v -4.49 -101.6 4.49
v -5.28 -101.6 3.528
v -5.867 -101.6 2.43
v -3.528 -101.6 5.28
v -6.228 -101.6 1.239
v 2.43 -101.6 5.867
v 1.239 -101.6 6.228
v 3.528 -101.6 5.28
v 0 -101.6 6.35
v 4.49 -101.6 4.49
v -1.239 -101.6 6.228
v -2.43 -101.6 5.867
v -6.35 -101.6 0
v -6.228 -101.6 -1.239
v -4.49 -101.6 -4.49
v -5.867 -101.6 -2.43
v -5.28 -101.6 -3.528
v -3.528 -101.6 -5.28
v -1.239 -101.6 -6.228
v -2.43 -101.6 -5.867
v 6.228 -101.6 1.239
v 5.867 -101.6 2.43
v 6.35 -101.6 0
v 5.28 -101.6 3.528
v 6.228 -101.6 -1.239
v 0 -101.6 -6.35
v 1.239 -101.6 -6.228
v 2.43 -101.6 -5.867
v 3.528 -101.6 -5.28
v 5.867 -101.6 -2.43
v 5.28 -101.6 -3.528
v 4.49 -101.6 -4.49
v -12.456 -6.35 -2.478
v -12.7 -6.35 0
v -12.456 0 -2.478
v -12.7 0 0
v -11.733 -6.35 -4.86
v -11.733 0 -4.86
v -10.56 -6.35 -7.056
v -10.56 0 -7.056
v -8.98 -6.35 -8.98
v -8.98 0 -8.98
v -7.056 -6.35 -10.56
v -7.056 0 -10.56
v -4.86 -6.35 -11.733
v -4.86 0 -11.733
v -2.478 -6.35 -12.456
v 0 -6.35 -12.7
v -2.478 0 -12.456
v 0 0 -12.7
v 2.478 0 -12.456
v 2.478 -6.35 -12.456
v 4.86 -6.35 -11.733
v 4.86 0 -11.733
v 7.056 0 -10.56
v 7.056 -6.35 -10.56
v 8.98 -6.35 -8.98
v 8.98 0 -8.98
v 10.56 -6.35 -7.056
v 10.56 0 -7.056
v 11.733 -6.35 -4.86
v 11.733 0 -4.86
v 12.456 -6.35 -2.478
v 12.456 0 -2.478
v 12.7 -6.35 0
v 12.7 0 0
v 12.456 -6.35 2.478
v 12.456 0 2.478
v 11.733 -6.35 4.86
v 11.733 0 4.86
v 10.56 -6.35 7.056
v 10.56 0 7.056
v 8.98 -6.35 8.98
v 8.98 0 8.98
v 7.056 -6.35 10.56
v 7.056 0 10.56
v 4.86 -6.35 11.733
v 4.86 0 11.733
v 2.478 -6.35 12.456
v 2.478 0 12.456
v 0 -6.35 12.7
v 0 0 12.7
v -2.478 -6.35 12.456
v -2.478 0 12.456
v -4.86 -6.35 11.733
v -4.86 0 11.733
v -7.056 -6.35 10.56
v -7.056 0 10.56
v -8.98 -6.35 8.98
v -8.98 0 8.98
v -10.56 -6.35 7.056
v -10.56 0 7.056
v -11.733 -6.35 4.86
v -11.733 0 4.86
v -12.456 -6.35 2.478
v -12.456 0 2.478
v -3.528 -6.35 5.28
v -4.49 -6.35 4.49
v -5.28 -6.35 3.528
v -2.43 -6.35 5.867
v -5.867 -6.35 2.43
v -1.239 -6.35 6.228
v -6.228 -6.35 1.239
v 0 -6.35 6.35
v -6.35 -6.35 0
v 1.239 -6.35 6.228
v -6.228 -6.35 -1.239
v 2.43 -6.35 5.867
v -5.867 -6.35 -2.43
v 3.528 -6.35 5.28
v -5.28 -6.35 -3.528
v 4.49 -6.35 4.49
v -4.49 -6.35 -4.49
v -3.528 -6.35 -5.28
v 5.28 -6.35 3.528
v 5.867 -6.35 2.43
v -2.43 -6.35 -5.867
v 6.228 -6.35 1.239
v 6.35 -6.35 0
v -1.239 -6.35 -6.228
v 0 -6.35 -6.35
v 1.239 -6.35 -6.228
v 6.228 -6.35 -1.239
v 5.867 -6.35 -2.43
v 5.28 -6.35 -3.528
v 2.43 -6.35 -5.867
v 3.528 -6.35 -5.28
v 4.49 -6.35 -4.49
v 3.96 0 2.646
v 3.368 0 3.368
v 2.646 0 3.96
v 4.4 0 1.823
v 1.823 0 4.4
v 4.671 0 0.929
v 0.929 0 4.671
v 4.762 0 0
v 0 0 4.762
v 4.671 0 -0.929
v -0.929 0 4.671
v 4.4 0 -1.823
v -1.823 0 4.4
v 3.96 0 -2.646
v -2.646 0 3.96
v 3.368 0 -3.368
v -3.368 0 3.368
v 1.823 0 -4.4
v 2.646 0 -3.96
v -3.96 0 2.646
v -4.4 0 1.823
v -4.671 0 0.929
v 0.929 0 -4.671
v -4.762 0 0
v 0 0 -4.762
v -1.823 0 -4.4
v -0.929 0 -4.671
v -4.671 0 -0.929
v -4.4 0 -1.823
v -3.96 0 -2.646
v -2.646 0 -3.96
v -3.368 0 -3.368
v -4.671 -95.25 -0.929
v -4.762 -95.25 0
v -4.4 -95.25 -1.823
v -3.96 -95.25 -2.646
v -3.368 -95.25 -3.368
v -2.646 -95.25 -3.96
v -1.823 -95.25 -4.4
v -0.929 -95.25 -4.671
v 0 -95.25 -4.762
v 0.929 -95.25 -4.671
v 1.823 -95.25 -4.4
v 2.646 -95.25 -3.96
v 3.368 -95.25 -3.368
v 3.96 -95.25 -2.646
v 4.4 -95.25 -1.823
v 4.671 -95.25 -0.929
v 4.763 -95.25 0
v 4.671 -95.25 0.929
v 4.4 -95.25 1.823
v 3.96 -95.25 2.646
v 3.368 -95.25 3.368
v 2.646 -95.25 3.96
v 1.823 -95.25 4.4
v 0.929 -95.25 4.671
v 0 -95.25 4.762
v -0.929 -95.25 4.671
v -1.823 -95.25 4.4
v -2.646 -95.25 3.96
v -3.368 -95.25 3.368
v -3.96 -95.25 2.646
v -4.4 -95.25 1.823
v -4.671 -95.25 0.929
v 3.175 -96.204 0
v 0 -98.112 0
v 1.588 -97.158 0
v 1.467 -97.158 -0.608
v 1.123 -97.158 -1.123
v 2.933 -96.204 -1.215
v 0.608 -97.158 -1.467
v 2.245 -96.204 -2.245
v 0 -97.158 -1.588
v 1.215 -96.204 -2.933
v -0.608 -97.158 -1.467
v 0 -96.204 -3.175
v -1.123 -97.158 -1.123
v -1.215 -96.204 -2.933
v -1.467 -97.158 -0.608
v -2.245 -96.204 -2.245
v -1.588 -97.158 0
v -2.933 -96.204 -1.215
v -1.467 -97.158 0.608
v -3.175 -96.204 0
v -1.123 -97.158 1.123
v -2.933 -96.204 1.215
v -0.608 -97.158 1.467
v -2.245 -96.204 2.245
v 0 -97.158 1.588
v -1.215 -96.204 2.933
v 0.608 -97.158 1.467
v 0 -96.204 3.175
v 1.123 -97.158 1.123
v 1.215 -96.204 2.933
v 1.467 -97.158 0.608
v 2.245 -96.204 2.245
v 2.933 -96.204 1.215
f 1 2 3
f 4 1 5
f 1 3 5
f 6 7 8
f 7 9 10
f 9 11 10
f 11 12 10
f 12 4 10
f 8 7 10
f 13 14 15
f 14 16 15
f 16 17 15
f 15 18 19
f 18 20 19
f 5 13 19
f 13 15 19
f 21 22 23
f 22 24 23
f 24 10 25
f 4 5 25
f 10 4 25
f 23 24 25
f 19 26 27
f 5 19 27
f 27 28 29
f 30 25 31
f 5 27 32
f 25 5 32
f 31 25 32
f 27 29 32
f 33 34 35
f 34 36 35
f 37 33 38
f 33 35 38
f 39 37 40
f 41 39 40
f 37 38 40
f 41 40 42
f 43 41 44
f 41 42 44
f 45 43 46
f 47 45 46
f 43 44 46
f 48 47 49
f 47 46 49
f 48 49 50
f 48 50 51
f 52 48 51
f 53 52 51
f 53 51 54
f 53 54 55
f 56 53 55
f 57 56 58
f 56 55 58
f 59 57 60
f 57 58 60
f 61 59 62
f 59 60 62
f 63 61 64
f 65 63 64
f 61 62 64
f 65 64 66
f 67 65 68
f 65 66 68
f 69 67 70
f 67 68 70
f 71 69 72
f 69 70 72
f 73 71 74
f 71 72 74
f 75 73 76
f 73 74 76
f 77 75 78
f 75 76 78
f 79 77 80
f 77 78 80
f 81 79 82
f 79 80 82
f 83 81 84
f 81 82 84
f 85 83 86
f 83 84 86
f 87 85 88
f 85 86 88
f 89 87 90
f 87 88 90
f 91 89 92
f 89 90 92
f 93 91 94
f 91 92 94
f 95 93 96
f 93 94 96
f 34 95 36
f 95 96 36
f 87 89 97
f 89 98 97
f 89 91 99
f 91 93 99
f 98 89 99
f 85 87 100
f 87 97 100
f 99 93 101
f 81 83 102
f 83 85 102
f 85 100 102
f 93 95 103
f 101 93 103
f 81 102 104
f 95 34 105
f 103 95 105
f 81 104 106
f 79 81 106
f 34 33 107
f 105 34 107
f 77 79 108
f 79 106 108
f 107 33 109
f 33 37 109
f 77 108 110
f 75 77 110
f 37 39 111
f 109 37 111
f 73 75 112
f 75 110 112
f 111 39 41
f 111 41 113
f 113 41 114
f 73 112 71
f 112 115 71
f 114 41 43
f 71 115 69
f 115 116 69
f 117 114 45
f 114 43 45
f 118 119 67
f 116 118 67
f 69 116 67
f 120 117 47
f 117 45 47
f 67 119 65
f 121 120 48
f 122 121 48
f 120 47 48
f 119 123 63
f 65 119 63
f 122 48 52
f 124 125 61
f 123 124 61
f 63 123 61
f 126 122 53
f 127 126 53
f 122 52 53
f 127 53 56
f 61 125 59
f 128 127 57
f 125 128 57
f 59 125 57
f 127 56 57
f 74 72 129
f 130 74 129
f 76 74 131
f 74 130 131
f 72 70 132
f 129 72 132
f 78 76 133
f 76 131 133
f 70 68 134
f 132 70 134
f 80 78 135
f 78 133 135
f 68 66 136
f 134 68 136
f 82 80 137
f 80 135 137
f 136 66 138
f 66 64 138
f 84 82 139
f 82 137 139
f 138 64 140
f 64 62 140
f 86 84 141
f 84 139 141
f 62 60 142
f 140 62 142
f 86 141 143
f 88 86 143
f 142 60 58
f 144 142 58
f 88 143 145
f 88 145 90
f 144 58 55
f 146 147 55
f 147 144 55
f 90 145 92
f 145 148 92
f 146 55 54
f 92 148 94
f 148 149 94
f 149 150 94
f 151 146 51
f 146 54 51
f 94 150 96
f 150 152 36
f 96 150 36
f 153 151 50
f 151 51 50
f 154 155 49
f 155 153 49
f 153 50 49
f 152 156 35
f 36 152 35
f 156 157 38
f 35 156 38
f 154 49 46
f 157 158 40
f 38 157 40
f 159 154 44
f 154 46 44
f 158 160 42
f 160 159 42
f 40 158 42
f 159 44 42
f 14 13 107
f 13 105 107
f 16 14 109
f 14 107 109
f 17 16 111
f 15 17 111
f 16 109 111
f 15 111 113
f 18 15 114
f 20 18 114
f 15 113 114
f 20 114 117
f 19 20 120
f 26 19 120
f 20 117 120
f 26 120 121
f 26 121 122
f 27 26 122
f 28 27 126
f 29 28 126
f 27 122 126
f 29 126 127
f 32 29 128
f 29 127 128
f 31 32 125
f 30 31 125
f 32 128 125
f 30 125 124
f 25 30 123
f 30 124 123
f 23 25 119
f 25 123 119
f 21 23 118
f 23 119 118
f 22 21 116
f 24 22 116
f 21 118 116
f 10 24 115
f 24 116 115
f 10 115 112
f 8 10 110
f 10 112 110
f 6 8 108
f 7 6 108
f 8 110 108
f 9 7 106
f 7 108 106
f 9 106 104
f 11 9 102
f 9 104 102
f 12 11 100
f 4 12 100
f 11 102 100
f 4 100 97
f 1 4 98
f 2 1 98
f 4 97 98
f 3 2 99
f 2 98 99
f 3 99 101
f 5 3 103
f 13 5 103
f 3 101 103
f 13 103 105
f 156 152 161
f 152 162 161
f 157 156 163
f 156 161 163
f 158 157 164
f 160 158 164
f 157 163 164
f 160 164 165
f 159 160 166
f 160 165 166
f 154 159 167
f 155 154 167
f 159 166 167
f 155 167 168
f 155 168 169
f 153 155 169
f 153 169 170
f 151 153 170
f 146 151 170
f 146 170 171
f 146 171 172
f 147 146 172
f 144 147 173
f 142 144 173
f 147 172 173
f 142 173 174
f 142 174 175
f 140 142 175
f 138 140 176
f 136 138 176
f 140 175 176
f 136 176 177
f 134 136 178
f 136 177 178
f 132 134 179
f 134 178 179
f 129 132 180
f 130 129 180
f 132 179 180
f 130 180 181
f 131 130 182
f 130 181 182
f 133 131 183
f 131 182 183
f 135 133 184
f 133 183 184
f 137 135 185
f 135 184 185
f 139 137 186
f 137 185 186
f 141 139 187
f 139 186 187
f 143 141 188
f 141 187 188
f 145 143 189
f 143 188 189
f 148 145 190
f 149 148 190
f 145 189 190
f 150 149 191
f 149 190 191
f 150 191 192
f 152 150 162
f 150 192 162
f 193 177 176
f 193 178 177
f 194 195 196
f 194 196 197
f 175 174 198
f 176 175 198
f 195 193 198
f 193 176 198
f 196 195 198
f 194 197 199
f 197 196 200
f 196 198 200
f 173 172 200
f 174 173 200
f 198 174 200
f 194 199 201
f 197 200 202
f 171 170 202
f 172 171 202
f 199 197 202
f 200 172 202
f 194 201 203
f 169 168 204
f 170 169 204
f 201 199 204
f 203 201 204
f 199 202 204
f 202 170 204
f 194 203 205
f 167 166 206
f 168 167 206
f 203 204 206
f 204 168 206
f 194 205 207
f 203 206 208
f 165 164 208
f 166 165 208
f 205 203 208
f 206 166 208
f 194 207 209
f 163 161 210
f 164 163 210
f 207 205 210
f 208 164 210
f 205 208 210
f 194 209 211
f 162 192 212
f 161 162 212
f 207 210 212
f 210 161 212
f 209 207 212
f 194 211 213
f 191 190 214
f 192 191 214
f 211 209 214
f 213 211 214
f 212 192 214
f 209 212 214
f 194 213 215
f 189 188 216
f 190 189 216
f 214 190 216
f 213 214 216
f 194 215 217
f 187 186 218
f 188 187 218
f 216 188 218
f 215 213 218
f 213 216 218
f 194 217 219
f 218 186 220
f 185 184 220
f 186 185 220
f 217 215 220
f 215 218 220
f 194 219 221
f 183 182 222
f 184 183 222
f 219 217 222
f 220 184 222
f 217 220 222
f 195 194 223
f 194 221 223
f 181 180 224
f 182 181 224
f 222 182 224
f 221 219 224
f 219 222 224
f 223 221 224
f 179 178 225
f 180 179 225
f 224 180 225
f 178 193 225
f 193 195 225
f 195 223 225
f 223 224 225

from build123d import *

# Parameters (mm, degrees)
F_3_8_0_375_DIAMETER_HOLE1_D     = 9.525
F_3_8_0_375_DIAMETER_HOLE1_DEPTH = 95.25
F_3_8_0_375_DIAMETER_HOLE1_TIP   = 2.861598698


with BuildPart() as part:
    # Sketch1 → Revolve1 (revolve)
    with BuildSketch(Plane.XY):
        Polygon((0, 0), (0, -101.6), (-6.35, -101.6), (-6.35, -6.35), (-12.7, -6.35), (-12.7, 0), align=None)
    revolve(axis=Axis((0, 0, 0), (0, -1, 0)))

    # 3/8 (0.375) Diameter Hole1
    with Locations(Plane(origin=(0, 0, 0), x_dir=(1, 0, 0), z_dir=(0, 1, 0))):
        with Locations((0, 0)):
            Hole(F_3_8_0_375_DIAMETER_HOLE1_D / 2, depth=F_3_8_0_375_DIAMETER_HOLE1_DEPTH)
            with Locations((0, 0, -(F_3_8_0_375_DIAMETER_HOLE1_DEPTH + F_3_8_0_375_DIAMETER_HOLE1_TIP / 2))):  # 118° drill point
                Cone(0, F_3_8_0_375_DIAMETER_HOLE1_D / 2, F_3_8_0_375_DIAMETER_HOLE1_TIP, mode=Mode.SUBTRACT)


solid = part.part
